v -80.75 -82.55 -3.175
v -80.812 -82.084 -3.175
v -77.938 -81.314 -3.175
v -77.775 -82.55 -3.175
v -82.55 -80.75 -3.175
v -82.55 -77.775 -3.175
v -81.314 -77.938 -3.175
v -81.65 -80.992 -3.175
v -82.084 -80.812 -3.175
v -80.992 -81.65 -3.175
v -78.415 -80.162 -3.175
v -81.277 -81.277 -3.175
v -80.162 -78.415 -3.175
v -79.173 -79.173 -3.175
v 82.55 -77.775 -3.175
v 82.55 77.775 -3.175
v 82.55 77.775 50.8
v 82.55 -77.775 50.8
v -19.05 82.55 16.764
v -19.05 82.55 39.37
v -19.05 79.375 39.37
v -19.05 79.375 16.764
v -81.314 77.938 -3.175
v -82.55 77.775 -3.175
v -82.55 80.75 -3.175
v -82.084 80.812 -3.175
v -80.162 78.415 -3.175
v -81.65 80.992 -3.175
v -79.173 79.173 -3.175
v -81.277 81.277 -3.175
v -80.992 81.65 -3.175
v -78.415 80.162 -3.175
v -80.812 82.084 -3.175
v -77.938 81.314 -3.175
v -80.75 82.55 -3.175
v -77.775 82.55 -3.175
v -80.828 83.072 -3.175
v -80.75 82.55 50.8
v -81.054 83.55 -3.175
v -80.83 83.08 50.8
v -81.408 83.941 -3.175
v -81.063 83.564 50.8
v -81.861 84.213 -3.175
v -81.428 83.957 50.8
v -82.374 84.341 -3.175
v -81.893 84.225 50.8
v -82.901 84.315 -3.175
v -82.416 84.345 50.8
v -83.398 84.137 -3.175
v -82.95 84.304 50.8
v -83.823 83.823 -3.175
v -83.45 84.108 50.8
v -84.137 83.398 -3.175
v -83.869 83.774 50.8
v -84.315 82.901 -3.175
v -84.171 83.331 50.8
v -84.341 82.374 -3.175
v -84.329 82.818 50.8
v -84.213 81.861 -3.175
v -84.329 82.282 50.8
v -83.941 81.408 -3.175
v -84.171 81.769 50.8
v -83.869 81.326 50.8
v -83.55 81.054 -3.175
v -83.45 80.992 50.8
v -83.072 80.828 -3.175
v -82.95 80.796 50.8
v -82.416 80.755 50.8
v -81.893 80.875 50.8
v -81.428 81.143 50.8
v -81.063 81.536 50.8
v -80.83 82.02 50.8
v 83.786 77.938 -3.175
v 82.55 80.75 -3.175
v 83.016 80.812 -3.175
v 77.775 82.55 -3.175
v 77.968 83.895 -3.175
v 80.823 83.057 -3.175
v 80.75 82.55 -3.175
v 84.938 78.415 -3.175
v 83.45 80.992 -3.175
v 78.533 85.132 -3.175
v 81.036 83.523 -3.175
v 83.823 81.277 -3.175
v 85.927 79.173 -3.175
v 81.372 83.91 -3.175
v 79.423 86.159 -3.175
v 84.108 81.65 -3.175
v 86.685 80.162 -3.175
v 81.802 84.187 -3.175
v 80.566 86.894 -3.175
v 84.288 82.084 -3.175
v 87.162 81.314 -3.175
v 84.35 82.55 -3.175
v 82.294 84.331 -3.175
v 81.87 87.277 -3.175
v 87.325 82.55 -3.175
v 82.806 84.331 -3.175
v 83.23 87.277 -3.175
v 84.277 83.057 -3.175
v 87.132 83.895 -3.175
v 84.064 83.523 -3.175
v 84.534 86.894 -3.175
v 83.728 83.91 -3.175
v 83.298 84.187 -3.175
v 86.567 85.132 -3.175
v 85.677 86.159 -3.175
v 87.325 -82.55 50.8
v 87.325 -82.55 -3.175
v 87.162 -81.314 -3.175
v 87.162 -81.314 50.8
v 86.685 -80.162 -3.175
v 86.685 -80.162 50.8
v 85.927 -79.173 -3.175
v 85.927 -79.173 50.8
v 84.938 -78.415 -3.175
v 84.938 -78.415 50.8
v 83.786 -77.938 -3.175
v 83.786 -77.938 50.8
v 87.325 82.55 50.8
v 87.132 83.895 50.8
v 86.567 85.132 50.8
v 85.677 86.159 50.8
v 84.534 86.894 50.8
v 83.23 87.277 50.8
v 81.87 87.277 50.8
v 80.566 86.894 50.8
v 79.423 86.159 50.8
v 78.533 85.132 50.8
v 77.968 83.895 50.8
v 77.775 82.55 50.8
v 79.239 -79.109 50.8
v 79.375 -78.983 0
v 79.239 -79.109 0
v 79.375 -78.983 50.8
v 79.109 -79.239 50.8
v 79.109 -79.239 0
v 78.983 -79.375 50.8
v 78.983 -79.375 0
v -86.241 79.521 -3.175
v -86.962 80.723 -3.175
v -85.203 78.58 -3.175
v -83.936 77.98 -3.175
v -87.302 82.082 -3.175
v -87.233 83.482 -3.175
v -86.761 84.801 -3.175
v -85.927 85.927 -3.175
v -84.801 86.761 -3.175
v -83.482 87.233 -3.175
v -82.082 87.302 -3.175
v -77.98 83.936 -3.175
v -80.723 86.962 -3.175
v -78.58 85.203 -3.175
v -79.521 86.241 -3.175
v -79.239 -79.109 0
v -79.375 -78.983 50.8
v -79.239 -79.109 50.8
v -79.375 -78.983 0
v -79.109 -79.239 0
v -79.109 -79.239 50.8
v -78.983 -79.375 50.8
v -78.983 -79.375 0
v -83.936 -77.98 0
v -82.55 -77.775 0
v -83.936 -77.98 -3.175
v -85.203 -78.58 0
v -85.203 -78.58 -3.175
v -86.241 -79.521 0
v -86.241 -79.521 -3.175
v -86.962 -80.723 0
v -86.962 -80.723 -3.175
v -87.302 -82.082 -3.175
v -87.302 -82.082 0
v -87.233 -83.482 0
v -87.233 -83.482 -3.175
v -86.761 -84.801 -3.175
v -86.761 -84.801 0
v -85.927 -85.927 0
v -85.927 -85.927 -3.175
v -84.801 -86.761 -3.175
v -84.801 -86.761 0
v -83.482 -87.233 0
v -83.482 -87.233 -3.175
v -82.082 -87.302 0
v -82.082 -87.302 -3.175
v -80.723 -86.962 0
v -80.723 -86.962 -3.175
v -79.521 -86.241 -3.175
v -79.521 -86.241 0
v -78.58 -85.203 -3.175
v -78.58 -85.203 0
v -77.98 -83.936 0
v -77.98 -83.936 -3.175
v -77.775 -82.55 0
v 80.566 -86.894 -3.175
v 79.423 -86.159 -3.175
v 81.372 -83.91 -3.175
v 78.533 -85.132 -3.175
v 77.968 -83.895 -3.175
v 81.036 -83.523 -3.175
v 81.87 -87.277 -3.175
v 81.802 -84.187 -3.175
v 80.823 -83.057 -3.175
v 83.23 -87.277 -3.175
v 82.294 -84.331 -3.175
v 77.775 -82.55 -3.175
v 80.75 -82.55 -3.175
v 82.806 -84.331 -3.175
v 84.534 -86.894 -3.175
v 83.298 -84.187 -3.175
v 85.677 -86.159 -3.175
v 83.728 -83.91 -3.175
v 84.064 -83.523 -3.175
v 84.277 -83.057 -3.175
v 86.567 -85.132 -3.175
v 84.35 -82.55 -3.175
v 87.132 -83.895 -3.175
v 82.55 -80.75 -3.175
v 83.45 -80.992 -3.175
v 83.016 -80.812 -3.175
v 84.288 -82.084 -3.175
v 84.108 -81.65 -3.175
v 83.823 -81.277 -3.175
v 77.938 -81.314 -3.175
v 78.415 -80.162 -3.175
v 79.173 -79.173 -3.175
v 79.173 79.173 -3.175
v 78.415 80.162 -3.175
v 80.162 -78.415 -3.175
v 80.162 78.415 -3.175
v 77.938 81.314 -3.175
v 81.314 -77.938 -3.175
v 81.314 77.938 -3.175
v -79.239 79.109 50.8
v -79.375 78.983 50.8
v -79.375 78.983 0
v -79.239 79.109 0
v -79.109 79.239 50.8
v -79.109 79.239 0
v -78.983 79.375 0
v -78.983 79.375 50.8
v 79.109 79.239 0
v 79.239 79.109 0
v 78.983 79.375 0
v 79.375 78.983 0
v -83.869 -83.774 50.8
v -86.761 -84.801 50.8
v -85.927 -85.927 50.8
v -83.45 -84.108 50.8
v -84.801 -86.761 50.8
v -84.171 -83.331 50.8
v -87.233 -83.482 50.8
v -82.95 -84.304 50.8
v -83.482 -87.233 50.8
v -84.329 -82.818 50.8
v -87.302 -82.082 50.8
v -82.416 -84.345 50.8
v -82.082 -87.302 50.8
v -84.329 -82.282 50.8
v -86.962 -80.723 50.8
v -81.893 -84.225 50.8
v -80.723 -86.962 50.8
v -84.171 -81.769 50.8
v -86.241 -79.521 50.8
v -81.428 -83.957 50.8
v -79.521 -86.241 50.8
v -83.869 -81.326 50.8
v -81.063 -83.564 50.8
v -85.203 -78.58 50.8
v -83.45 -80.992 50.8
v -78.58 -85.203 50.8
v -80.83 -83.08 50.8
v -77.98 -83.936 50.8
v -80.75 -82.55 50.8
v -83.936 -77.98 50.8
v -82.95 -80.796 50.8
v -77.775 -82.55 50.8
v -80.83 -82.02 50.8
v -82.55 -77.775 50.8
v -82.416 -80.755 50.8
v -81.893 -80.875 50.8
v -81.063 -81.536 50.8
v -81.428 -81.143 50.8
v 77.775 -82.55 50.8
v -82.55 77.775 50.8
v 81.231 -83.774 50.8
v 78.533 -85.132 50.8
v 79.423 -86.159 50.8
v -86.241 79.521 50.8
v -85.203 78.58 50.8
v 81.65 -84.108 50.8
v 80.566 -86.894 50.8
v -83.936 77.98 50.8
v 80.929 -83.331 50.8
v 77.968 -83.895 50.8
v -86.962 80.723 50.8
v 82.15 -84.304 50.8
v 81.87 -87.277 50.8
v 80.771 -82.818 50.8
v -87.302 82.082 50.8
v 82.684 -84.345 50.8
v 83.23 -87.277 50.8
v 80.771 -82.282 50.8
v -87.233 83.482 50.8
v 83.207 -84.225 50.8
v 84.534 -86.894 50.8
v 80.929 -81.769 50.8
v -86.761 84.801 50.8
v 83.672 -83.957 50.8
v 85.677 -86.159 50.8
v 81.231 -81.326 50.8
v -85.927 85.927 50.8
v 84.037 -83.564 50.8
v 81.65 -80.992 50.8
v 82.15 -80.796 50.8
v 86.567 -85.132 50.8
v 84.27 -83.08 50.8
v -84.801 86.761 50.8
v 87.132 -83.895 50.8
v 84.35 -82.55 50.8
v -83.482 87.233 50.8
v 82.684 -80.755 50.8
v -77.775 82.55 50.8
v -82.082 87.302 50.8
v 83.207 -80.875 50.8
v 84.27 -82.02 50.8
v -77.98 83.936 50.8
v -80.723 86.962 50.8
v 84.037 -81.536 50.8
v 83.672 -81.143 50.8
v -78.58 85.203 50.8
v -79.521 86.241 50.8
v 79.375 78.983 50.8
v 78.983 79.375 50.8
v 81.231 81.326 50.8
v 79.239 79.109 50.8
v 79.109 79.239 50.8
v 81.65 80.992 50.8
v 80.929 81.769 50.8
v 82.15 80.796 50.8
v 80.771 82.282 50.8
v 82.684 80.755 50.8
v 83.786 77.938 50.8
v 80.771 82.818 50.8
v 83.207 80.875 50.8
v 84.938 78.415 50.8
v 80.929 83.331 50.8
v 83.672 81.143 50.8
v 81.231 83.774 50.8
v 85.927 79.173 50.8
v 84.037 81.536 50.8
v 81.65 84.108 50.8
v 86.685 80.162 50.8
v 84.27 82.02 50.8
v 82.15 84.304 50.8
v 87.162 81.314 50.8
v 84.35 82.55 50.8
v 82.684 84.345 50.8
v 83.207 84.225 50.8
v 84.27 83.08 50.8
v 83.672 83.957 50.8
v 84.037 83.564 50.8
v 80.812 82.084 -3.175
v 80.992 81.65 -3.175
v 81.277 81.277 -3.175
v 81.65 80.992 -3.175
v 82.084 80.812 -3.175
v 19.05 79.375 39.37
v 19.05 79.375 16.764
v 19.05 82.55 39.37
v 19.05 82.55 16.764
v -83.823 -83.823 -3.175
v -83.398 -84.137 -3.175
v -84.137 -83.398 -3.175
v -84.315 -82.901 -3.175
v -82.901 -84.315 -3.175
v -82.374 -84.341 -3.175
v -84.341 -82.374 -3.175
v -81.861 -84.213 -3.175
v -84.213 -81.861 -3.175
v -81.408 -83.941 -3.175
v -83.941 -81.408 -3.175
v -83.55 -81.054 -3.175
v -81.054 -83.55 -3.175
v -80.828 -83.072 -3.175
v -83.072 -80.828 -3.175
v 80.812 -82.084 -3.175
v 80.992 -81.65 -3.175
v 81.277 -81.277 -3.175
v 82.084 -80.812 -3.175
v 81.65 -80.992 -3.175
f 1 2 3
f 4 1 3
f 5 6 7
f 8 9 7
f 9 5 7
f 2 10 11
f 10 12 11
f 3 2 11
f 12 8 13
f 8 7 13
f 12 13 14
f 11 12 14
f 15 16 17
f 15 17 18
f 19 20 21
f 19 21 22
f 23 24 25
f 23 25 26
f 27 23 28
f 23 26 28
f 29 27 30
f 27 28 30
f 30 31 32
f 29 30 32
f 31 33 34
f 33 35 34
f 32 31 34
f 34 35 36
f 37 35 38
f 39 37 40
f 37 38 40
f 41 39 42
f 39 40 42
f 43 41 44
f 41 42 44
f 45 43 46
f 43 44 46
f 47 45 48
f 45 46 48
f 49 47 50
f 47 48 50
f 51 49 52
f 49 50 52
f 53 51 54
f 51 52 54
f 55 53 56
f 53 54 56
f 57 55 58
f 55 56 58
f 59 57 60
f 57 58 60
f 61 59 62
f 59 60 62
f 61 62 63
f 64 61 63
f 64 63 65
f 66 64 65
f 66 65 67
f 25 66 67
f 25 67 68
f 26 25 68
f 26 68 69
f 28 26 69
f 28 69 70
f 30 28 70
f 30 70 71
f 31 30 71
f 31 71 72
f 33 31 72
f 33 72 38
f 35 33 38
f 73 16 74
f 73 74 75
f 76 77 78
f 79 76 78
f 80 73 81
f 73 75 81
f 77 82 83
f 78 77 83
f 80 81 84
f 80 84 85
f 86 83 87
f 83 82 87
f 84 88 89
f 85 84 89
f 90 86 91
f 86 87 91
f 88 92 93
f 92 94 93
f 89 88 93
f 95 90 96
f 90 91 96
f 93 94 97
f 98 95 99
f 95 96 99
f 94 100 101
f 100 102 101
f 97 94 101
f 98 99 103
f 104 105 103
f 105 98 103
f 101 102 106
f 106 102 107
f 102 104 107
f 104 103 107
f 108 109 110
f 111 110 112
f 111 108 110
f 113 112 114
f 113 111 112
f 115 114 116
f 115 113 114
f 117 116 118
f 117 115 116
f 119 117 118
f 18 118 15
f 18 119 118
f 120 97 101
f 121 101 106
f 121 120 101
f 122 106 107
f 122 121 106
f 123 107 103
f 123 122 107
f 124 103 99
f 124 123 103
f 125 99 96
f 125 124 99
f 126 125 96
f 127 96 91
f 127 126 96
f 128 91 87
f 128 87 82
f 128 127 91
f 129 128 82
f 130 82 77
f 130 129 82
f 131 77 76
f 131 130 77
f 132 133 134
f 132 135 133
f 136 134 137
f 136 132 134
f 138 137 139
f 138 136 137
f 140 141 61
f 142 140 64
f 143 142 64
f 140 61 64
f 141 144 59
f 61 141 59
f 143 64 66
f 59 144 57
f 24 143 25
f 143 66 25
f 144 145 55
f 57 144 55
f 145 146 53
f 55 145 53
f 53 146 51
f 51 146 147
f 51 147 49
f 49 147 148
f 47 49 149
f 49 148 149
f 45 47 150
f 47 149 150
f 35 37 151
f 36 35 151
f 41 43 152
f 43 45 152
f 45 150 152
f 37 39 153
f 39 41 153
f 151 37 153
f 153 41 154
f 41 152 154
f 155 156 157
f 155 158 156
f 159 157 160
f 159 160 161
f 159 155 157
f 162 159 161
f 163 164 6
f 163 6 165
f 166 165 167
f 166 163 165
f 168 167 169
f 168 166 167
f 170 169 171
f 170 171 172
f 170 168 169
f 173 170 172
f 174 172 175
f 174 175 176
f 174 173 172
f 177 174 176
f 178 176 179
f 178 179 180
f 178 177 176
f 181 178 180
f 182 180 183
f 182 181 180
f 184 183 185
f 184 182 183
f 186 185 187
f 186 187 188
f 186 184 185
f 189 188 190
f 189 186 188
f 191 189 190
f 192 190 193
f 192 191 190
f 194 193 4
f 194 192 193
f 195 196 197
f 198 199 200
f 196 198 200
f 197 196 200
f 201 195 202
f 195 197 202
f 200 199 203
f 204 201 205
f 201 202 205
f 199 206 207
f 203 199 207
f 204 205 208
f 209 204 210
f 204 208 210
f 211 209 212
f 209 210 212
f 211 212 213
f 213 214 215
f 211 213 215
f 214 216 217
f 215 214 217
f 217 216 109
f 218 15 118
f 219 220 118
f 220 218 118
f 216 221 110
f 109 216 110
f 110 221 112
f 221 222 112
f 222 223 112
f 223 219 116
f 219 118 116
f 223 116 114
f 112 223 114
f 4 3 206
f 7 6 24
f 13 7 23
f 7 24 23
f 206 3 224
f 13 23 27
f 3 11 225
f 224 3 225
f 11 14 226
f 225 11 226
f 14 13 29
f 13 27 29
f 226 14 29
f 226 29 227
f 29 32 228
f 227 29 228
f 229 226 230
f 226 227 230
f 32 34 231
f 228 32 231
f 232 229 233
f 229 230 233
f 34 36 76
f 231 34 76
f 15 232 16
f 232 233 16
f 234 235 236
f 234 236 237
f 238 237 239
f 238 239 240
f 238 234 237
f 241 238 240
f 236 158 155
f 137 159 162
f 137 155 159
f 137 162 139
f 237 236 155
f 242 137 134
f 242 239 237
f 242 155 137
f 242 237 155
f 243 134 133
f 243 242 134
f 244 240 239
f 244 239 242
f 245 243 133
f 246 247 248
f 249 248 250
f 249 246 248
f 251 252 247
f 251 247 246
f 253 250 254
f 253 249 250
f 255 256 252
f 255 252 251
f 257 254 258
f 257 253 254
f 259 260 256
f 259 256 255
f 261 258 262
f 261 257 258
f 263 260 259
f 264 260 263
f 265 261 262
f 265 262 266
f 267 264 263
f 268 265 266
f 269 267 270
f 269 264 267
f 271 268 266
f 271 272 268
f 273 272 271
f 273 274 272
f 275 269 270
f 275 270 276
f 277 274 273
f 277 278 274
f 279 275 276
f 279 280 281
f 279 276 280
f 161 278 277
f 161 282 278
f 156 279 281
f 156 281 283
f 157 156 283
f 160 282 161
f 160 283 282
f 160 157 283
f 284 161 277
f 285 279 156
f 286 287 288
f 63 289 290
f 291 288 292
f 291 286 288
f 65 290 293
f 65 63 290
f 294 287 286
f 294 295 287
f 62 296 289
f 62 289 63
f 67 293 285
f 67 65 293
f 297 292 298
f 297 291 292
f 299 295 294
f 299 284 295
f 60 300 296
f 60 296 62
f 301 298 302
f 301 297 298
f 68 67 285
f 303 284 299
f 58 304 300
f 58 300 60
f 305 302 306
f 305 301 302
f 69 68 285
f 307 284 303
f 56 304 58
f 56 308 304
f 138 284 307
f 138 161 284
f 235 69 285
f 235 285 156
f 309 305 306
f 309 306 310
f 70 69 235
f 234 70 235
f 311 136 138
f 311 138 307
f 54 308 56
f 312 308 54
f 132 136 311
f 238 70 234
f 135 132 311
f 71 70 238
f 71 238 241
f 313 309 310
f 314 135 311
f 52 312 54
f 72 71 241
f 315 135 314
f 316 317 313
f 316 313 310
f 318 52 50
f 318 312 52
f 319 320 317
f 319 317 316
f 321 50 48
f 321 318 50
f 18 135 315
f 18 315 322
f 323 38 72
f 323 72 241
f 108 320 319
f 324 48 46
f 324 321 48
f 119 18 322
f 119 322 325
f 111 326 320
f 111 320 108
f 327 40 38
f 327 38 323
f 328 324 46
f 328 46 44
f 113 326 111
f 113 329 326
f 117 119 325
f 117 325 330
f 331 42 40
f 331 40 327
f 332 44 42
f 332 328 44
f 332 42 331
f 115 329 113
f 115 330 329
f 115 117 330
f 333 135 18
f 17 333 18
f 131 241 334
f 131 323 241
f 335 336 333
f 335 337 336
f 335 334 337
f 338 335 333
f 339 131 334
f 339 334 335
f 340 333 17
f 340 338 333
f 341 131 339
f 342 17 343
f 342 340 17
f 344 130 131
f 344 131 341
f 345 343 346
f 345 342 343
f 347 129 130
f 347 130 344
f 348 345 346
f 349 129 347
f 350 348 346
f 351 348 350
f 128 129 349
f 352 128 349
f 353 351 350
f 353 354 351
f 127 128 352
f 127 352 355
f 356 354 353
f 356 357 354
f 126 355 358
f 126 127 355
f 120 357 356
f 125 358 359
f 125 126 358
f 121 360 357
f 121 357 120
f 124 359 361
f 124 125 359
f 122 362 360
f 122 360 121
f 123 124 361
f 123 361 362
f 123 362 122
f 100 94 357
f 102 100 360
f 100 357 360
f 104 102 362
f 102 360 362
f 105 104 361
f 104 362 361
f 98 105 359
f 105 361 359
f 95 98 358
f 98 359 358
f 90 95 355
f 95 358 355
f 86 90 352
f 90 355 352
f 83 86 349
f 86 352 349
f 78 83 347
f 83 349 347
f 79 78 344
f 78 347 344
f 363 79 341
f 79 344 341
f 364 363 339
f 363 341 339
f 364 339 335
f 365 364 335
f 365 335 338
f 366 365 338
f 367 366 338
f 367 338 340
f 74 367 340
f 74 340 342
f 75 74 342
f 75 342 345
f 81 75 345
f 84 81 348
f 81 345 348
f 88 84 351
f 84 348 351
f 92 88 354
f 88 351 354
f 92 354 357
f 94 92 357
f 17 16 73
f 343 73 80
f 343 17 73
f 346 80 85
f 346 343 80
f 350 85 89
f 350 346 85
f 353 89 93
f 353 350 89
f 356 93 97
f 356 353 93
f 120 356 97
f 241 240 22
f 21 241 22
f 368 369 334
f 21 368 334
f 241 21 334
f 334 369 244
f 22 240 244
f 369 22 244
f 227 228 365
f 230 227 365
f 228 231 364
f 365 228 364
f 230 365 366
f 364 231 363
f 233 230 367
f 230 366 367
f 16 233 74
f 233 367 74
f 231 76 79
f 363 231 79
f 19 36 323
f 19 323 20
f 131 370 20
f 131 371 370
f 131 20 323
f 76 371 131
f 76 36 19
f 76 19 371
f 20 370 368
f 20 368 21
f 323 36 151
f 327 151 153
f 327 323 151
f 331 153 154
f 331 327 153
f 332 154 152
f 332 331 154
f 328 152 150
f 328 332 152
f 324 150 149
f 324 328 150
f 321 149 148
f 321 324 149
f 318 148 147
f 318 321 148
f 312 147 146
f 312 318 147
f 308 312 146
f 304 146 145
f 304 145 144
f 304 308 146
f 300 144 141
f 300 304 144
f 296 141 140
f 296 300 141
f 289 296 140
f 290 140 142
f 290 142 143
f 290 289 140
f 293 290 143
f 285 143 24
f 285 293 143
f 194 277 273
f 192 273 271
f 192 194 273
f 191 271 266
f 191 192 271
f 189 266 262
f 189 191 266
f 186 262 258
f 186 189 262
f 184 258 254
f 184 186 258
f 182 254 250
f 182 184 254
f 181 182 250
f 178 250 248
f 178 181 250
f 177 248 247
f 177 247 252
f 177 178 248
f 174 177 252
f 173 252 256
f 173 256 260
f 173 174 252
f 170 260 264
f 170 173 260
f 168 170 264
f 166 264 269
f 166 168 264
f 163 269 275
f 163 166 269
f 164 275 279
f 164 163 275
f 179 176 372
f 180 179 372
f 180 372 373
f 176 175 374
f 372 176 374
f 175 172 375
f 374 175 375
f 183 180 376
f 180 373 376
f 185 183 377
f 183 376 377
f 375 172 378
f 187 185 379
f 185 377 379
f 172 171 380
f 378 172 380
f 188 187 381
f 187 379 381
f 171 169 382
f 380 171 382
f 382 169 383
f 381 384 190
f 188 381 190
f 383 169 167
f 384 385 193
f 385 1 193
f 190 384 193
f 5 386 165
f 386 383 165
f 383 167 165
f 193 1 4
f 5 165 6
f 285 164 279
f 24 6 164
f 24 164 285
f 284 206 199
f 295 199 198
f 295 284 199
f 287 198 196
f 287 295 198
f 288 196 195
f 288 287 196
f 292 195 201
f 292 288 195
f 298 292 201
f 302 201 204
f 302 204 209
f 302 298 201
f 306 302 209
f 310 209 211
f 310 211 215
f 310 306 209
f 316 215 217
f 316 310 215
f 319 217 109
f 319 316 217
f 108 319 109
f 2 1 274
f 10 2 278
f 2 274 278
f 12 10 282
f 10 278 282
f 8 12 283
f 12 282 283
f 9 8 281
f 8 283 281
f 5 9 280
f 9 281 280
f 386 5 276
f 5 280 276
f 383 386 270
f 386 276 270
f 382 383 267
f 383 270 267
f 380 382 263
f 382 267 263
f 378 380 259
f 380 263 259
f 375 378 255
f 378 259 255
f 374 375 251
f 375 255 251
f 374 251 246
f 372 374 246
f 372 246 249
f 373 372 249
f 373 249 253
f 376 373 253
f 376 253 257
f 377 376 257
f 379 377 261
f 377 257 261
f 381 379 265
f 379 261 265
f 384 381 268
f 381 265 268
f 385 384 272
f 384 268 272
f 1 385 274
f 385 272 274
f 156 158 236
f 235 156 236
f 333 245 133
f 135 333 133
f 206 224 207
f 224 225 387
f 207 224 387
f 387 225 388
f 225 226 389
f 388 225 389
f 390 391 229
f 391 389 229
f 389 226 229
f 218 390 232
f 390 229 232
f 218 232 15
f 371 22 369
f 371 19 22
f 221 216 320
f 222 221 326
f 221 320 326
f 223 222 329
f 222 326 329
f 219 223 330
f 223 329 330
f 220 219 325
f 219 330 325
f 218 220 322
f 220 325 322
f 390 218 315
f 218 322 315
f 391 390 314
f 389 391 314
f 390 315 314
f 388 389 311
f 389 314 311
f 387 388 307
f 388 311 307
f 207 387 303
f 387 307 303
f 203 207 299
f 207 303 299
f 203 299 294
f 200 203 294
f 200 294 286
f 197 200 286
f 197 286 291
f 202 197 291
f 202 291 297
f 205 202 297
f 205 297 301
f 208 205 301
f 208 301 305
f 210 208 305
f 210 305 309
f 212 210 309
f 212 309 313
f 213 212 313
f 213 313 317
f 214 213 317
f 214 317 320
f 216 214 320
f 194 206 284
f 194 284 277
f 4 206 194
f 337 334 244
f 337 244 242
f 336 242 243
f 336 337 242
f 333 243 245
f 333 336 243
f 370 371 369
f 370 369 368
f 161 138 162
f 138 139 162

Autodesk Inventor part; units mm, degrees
ref_plane "YZ Plane" through (0, 0, 0) normal (1, 0, 0) x (0, 1, 0)
ref_plane "XZ Plane" through (0, 0, 0) normal (0, 1, 0) x (-1, 0, 0)
ref_plane "XY Plane" through (0, 0, 0) normal (0, 0, 1) x (1, 0, 0)
sketch "Sketch1" plane through (0, 0, 0) normal (0, 0, 1) x (1, 0, 0)
  line L0 (-79.375, 79.375) -> (79.375, 79.375)
  line L1 (79.375, 79.375) -> (79.375, -79.375)
  line L2 (79.375, -79.375) -> (-79.375, -79.375)
  line L3 (-79.375, -79.375) -> (-79.375, 79.375)
  line L4 (-79.375, 79.375) -> (79.375, -79.375) construction
  line L5 (79.375, 79.375) -> (-79.375, -79.375) construction
  point P0 (0, 0)
  dimension "d0" = 158.75
extrude "Extrusion1" add sketch "Sketch1" along normal blind 50.8
shell "Shell1" thickness 3.175 outward yes removed faces 1 at (-26.4583, 26.4583, 50.8)
sketch "Sketch2" plane through (0, 0, 0) normal (0, 0, 1) x (1, 0, 0)
  line L0 (-82.55, 82.55) -> (-82.55, -82.55) projected
  circle A0 centre (-82.55, 82.55) radius 4.7752
  line L1 (82.55, -82.55) -> (82.55, 82.55) projected
  circle A1 centre (82.55, 82.55) radius 4.7752
  line L2 (-82.55, -82.55) -> (82.55, -82.55) projected
  circle A2 centre (82.55, -82.55) radius 4.7752
  circle A3 centre (-82.55, -82.55) radius 4.7752
  point P0 (0, 0)
  dimension "d4" = 9.5504
extrude "Extrusion2" add sketch "Sketch2" along normal blind 50.8 and the other way blind 3.175
sketch "Sketch3" plane through (0, 0, 50.8) normal (0, 0, 1) x (1, 0, 0)
  line L0 (-82.55, 77.7748) -> (-82.55, -77.7748) projected
  circle A0 centre (-82.55, -82.55) radius 1.7996
  circle A1 centre (82.55, 82.55) radius 1.7996
  line L1 (-77.7748, -82.55) -> (77.7748, -82.55) projected
  circle A2 centre (82.55, -82.55) radius 1.7996
  circle A3 centre (-82.55, 82.55) radius 1.7996
  point P0 (0, 0)
  dimension "d9" = 3.5992
extrude "Extrusion3" cut sketch "Sketch3" along normal mid plane 107.95
sketch "Sketch4" plane through (-77.7748, 82.55, -3.175) normal (0, 1, 0) x (1, 0, 0)
  line L0 (58.7248, -19.939) -> (96.8248, -19.939)
  line L1 (96.8248, -19.939) -> (96.8248, -42.545)
  line L2 (96.8248, -42.545) -> (58.7248, -42.545)
  line L3 (58.7248, -42.545) -> (58.7248, -19.939)
  line L4 (58.7248, -19.939) -> (96.8248, -42.545) construction
  line L5 (96.8248, -19.939) -> (58.7248, -42.545) construction
  line L6 (155.5496, -53.975) -> (0, -53.975) projected
  point P0 (77.7748, -3.175)
  point P1 (77.7748, -31.242)
  point P2 (77.7748, -31.242)
  point P3 (160.9128, -53.975)
  point P4 (-0.588, -53.975)
  dimension "d12" = 38.1
  dimension "d13" = 22.606
  dimension "d14" = 11.43
extrude "Extrusion4" cut sketch "Sketch4" against normal up to next
properties part number "PS-01" material "Aluminum 6061(1)"
